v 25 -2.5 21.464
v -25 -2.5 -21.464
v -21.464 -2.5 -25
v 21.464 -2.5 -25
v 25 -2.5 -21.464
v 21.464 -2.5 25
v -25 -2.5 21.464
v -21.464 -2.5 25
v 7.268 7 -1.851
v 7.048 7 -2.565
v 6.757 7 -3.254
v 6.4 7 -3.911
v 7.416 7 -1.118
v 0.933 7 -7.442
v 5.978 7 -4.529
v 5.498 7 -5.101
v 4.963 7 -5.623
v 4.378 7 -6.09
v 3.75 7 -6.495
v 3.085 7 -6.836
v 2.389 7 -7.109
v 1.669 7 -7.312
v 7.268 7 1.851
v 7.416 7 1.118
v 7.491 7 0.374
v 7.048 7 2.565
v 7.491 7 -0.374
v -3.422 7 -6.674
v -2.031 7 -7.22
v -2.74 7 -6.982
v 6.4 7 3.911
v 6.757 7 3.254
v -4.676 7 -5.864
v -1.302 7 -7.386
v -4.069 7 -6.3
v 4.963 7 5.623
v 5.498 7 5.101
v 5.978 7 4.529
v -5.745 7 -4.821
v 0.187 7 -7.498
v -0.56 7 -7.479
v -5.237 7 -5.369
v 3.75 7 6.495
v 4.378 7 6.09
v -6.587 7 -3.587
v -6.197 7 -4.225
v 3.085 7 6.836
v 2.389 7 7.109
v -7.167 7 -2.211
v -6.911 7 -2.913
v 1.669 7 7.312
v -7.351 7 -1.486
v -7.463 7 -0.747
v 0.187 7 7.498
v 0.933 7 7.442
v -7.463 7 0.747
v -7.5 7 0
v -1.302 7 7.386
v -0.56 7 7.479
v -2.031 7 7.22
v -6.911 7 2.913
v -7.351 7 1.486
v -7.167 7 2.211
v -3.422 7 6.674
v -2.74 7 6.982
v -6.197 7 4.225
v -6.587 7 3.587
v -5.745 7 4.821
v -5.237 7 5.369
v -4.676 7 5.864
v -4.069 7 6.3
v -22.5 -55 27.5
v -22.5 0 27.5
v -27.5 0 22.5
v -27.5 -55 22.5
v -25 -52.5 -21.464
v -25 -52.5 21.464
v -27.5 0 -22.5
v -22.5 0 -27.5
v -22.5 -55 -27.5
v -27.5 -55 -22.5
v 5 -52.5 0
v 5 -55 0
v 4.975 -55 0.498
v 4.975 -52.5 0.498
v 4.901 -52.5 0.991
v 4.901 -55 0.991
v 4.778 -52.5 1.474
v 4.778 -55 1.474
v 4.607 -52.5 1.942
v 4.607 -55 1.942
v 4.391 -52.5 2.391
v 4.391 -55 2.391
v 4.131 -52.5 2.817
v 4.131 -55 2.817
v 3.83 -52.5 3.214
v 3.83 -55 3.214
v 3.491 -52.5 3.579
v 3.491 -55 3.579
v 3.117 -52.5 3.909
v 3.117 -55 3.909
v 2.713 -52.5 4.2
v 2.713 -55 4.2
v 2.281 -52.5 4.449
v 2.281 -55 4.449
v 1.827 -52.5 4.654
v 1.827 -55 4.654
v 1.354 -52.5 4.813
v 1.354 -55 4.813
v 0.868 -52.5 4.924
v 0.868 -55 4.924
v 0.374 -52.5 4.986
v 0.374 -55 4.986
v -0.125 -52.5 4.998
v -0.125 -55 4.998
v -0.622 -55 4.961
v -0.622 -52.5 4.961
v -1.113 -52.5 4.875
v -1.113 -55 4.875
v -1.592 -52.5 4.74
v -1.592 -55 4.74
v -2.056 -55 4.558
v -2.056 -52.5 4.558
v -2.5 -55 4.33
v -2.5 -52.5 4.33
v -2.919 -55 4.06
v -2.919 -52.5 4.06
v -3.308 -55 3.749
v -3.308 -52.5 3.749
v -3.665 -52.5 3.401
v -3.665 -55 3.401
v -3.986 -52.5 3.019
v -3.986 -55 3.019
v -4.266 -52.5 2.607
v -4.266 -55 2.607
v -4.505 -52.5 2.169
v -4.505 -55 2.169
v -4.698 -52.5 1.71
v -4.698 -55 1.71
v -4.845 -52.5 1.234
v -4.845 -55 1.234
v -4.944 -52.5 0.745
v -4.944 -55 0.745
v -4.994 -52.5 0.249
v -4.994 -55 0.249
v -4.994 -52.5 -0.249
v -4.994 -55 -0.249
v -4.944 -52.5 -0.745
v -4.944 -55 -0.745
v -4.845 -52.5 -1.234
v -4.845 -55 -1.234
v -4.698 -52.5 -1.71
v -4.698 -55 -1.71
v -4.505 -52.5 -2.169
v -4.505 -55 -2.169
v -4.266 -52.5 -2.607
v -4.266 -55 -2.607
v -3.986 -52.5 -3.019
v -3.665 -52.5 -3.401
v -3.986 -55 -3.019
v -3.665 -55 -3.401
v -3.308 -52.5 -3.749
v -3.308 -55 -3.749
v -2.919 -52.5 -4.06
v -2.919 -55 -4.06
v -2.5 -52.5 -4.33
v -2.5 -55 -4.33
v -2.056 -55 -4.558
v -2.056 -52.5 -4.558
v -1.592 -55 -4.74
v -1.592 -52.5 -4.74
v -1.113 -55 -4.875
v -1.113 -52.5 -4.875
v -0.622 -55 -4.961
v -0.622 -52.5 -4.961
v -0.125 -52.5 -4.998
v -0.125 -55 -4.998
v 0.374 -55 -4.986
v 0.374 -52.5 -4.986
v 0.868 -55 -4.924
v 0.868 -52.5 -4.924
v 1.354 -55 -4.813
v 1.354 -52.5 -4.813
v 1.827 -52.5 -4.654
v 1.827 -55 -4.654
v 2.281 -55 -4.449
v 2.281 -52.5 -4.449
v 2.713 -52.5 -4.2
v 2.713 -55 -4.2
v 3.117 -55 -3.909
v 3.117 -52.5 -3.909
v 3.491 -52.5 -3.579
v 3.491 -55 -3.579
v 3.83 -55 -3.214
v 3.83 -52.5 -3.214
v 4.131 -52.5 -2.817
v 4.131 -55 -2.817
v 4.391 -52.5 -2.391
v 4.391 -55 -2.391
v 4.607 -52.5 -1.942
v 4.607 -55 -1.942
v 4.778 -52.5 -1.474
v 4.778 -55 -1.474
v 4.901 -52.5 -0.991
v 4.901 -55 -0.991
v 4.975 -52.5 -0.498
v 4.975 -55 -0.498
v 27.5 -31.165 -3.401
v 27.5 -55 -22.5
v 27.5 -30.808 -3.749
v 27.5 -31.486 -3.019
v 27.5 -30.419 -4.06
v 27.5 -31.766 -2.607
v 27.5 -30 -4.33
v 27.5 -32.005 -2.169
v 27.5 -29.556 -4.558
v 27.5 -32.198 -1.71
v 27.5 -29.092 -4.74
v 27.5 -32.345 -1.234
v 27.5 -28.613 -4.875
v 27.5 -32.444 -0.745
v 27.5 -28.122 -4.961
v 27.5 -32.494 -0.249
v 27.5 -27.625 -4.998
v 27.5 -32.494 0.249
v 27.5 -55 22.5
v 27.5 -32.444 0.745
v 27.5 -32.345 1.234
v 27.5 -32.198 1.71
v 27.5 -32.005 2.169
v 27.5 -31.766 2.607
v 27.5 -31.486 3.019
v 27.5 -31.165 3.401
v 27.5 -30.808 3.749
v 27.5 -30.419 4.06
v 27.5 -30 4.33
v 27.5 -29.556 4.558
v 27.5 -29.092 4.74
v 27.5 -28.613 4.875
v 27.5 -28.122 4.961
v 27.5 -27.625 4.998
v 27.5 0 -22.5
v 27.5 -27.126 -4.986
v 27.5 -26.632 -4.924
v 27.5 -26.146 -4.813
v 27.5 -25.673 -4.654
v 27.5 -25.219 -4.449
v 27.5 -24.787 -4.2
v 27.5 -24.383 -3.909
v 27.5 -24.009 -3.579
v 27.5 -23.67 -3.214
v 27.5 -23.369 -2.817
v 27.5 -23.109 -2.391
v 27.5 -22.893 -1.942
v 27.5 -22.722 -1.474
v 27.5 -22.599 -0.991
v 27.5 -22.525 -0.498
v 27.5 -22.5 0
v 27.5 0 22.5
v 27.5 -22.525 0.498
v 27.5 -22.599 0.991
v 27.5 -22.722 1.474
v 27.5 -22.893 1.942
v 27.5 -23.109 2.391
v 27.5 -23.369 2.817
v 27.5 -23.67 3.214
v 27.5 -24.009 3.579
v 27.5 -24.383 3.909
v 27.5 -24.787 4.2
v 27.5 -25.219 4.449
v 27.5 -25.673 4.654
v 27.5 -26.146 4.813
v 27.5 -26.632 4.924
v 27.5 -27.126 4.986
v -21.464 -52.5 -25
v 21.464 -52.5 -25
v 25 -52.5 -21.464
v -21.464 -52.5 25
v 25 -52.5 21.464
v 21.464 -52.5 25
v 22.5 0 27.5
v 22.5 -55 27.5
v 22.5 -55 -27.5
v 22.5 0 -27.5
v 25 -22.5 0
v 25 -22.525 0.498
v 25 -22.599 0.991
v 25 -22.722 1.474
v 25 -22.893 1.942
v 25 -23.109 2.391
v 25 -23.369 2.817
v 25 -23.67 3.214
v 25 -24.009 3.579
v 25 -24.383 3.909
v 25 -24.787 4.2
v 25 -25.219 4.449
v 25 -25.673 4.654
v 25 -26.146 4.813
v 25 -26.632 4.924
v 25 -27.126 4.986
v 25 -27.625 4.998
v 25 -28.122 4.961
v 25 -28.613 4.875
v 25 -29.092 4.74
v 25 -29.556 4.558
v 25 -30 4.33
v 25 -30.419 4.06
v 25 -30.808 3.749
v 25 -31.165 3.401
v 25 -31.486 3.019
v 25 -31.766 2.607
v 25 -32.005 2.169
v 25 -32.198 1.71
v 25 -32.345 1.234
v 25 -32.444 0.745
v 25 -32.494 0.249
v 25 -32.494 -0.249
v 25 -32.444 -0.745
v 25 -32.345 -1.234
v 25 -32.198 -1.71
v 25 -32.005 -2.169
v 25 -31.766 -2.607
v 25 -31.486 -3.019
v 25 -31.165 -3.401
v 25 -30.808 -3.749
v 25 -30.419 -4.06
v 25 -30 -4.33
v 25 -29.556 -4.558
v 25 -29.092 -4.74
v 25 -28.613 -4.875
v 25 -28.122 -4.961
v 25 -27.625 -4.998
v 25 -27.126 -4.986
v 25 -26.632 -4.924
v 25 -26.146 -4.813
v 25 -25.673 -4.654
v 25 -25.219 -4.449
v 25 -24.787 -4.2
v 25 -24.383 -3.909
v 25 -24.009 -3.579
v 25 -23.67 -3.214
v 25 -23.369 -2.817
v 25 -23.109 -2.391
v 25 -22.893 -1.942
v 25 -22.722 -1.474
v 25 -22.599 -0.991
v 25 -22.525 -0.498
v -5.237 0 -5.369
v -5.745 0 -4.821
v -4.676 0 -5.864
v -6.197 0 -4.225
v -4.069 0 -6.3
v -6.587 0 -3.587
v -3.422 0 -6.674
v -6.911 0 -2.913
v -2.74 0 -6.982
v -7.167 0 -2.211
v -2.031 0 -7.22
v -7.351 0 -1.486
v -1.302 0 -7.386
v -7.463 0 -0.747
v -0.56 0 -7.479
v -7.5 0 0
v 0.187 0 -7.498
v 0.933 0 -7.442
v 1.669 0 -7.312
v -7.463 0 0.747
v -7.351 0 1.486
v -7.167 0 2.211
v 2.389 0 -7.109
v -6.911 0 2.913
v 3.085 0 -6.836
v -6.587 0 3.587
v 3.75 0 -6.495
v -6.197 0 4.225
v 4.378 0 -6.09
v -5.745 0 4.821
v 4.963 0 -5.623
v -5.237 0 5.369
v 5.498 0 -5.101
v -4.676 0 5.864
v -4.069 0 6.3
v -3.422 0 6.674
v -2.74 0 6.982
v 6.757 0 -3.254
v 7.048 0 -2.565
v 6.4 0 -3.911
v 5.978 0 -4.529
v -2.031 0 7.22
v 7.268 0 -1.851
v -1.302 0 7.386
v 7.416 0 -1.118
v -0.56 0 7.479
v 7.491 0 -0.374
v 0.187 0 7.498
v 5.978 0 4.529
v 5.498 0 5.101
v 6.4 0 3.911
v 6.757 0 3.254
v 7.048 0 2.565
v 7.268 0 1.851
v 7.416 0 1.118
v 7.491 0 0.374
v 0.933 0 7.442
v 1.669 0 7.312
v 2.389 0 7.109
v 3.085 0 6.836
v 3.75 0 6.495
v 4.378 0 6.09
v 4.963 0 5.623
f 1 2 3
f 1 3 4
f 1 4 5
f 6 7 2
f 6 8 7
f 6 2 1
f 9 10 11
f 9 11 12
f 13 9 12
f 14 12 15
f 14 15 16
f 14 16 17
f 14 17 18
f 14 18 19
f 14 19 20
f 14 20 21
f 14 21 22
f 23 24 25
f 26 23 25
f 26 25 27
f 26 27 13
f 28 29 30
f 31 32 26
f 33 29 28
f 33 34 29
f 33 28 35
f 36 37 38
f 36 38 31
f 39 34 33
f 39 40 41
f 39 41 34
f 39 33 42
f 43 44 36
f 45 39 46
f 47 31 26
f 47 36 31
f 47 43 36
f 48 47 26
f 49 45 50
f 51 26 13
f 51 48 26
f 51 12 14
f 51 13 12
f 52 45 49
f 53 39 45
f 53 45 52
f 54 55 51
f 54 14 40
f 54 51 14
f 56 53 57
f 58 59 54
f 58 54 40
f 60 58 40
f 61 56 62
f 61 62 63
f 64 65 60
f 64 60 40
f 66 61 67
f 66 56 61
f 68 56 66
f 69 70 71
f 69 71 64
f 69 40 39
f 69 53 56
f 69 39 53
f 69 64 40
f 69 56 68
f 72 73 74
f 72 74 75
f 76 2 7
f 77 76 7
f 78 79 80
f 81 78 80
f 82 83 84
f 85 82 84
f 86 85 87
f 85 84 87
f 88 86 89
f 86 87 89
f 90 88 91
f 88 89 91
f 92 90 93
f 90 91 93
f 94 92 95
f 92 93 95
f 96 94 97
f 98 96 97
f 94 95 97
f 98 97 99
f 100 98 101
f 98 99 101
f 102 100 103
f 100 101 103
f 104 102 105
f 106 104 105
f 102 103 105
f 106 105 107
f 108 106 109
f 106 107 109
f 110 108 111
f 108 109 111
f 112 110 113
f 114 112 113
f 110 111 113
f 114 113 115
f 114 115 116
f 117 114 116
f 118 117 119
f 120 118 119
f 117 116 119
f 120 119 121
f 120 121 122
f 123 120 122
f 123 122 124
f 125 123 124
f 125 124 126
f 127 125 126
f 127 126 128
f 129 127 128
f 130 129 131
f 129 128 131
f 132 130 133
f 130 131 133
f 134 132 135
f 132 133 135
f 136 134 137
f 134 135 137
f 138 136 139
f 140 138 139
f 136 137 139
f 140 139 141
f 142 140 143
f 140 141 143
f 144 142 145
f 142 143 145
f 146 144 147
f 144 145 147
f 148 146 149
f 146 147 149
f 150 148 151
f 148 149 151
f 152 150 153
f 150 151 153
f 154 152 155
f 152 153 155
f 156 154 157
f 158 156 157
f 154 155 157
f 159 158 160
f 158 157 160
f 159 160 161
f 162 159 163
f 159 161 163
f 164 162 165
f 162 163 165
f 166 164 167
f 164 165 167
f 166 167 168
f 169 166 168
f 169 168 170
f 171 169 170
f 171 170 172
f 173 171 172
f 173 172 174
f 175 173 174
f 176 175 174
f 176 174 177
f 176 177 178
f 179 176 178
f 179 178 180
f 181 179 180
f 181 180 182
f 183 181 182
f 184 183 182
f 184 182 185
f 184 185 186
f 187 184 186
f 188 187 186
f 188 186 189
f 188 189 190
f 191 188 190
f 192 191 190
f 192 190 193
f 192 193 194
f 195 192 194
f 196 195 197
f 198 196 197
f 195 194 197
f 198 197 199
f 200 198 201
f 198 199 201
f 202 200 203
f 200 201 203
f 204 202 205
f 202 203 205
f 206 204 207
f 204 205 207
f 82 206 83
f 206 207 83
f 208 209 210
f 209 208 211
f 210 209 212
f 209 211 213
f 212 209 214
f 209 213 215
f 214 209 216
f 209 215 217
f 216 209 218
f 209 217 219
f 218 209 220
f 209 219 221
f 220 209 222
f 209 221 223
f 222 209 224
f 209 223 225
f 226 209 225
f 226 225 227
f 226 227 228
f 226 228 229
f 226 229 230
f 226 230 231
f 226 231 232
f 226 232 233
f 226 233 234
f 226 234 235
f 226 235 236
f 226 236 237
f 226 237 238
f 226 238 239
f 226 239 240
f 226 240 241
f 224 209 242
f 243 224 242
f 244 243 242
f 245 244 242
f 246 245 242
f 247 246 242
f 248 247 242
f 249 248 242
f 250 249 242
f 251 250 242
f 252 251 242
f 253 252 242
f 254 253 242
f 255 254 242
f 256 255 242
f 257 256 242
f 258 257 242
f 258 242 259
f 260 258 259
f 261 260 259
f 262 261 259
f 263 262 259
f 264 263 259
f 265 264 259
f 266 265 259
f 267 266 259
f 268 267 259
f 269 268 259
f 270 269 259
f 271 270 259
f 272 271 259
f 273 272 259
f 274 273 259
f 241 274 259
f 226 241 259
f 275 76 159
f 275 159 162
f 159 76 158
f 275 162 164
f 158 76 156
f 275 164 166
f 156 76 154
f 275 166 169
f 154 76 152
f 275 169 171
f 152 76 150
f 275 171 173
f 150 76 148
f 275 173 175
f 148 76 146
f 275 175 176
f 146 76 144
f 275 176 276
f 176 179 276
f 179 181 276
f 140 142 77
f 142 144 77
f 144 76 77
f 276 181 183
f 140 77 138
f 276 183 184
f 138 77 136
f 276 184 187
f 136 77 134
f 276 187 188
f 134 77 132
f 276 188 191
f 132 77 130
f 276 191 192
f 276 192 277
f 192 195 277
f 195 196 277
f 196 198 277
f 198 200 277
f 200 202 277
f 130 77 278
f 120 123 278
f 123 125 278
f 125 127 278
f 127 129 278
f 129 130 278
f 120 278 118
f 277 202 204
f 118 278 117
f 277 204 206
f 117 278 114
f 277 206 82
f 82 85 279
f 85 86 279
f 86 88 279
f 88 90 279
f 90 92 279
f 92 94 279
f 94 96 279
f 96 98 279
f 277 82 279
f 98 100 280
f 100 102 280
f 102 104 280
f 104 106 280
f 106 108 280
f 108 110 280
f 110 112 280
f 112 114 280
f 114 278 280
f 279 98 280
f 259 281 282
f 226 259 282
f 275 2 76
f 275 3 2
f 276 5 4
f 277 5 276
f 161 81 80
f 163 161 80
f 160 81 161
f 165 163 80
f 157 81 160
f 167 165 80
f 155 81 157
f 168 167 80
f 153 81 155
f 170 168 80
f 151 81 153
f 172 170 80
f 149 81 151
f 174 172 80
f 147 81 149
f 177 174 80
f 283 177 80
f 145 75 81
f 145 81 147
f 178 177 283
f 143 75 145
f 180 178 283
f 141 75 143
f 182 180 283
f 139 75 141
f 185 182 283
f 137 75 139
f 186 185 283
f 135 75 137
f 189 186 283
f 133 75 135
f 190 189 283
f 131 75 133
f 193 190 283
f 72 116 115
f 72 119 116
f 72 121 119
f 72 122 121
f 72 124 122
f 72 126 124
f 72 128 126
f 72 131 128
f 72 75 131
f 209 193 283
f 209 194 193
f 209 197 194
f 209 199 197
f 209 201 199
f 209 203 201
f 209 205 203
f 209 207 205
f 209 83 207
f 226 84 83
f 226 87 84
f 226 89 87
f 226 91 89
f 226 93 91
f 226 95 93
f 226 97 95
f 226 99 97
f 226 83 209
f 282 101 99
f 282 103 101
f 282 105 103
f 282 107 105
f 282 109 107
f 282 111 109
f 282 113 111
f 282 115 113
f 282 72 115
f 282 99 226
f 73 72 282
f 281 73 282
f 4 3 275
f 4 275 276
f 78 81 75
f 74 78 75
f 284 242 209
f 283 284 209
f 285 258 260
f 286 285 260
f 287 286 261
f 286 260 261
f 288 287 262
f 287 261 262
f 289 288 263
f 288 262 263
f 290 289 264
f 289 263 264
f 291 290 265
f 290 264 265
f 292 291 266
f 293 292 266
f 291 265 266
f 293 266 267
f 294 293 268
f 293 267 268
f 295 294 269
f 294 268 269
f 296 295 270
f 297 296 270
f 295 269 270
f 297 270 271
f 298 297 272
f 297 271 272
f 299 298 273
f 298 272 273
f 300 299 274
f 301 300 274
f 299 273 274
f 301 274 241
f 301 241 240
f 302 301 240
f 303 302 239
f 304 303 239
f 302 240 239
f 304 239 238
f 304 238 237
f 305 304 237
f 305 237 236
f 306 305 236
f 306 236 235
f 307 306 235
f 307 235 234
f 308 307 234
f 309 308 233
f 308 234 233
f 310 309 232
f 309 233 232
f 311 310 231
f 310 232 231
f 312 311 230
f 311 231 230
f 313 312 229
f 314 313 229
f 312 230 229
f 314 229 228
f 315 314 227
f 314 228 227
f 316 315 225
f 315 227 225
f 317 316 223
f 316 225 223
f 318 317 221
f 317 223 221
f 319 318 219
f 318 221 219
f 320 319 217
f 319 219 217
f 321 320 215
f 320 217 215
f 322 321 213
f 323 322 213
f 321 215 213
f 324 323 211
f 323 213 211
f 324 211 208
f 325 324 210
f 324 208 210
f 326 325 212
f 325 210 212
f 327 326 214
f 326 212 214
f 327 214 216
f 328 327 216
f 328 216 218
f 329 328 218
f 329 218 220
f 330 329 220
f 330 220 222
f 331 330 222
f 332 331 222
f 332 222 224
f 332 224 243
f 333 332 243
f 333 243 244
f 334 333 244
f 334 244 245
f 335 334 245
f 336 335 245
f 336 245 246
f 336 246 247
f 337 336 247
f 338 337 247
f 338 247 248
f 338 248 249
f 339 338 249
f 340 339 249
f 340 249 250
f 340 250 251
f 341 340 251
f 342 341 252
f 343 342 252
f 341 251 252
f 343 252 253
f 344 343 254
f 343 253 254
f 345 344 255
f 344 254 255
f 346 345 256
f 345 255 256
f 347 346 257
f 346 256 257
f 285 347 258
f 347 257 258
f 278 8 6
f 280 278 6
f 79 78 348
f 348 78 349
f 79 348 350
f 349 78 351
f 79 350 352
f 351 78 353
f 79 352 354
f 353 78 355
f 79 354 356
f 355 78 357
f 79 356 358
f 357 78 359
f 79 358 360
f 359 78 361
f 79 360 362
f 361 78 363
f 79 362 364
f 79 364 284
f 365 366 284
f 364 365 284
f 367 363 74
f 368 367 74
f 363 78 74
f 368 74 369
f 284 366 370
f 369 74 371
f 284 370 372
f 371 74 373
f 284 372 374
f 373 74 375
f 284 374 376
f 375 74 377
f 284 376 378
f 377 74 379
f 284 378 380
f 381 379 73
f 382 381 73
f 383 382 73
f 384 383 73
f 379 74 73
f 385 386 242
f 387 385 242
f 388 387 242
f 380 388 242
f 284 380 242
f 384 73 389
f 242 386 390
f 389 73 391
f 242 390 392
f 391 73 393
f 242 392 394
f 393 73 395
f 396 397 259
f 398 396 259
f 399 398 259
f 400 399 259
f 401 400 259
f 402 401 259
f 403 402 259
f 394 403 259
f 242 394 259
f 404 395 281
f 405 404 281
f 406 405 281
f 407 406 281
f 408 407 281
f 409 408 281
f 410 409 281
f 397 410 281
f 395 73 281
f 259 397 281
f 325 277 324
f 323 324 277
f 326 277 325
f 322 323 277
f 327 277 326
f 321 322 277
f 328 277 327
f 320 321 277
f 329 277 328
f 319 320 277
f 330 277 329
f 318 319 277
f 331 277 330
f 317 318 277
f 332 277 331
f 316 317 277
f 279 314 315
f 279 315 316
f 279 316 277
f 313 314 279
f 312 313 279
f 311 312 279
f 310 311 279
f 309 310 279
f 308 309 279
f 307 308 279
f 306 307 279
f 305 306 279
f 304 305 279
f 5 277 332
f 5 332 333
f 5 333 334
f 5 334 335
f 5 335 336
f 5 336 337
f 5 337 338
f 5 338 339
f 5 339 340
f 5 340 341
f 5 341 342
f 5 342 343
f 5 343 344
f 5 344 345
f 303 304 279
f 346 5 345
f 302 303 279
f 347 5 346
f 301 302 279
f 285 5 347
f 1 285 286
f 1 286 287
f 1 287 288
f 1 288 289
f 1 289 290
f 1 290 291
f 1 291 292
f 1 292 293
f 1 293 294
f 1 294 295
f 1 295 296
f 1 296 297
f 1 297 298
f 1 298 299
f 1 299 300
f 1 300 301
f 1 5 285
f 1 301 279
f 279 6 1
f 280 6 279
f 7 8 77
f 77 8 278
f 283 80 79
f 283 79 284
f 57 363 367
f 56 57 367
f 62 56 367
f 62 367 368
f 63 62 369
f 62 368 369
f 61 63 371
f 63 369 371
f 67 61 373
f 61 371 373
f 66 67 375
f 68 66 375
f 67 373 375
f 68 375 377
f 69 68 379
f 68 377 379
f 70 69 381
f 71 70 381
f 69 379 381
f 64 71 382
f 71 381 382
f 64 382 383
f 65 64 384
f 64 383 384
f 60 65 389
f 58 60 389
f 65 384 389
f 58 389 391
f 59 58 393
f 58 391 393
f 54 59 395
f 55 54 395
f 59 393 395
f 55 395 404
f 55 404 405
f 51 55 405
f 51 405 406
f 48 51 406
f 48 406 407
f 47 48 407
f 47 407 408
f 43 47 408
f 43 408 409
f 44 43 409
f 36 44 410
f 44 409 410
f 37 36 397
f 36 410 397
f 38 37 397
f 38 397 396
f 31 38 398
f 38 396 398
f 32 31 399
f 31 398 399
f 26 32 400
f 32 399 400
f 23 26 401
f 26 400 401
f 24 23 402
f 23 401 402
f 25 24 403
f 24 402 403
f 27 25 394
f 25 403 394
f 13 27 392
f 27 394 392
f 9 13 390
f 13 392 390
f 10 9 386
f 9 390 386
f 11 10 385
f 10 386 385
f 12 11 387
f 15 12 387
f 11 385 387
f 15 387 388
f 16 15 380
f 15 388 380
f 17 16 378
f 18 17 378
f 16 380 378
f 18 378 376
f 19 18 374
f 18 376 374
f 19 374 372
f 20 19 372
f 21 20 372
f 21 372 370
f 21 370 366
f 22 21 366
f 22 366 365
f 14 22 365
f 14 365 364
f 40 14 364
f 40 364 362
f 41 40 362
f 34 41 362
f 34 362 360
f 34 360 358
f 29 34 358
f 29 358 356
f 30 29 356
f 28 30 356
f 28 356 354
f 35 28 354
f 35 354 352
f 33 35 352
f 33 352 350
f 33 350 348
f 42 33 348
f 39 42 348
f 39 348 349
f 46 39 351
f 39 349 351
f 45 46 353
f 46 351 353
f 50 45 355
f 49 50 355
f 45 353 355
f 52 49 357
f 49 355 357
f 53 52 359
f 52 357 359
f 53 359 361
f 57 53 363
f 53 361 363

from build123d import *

# Parameters (mm, degrees)
F0_W      = 55
F0_H      = 55
F1_DEPTH  = 55
F2_SIZE   = 5
F5_T      = -2.5
F7_DEPTH  = 2.5
F4_R      = 5
F8_DEPTH  = 2.5
F3_R      = 5
F9_DEPTH  = 2.5
F10_R     = 7.5
F11_DEPTH = 7


with BuildPart() as f1:
    # F0 (on Front) → F1 (new body)
    with BuildSketch(Plane.XZ):
        Rectangle(F0_W, F0_H)
    extrude(amount=F1_DEPTH)

    # F2
    f2_edges = [f1.edges().sort_by_distance(p)[0] for p in [
        (27.5, -27.5, 27.5),
        (-27.5, -27.5, 27.5),
        (27.5, -27.5, -27.5),
        (-27.5, -27.5, -27.5),
    ]]
    chamfer(f2_edges, length=F2_SIZE)

    # F5
    f5_openings = [f1.faces().sort_by_distance(p)[0] for p in [
        (0, -55, 0),
    ]]
    offset(amount=F5_T, openings=f5_openings)

    # F6 (on face) → F7 (join)
    with BuildSketch(Plane.XZ.offset(55)):
        Polygon((27.5, 22.5), (22.5, 27.5), (-22.5, 27.5), (-27.5, 22.5), (-27.5, -22.5), (-22.5, -27.5), (22.5, -27.5), (27.5, -22.5), align=None)
    extrude(amount=-F7_DEPTH)

    # F4 (on face) → F8 (cut)
    with BuildSketch(Plane.YZ.offset(27.5)):
        with Locations((-27.5, 0)):
            Circle(F4_R)
    extrude(amount=-F8_DEPTH, mode=Mode.SUBTRACT)

    # F3 (on face) → F9 (cut)
    with BuildSketch(Plane.XZ.offset(55)):
        Circle(F3_R)
    extrude(amount=-F9_DEPTH, mode=Mode.SUBTRACT)

    # F10 (on face) → F11 (join)
    with BuildSketch(Plane(origin=(0, 0, 0), x_dir=(-1, 0, 0), z_dir=(0, 1, 0))):
        Circle(F10_R)
    extrude(amount=F11_DEPTH)


solid = f1.part
